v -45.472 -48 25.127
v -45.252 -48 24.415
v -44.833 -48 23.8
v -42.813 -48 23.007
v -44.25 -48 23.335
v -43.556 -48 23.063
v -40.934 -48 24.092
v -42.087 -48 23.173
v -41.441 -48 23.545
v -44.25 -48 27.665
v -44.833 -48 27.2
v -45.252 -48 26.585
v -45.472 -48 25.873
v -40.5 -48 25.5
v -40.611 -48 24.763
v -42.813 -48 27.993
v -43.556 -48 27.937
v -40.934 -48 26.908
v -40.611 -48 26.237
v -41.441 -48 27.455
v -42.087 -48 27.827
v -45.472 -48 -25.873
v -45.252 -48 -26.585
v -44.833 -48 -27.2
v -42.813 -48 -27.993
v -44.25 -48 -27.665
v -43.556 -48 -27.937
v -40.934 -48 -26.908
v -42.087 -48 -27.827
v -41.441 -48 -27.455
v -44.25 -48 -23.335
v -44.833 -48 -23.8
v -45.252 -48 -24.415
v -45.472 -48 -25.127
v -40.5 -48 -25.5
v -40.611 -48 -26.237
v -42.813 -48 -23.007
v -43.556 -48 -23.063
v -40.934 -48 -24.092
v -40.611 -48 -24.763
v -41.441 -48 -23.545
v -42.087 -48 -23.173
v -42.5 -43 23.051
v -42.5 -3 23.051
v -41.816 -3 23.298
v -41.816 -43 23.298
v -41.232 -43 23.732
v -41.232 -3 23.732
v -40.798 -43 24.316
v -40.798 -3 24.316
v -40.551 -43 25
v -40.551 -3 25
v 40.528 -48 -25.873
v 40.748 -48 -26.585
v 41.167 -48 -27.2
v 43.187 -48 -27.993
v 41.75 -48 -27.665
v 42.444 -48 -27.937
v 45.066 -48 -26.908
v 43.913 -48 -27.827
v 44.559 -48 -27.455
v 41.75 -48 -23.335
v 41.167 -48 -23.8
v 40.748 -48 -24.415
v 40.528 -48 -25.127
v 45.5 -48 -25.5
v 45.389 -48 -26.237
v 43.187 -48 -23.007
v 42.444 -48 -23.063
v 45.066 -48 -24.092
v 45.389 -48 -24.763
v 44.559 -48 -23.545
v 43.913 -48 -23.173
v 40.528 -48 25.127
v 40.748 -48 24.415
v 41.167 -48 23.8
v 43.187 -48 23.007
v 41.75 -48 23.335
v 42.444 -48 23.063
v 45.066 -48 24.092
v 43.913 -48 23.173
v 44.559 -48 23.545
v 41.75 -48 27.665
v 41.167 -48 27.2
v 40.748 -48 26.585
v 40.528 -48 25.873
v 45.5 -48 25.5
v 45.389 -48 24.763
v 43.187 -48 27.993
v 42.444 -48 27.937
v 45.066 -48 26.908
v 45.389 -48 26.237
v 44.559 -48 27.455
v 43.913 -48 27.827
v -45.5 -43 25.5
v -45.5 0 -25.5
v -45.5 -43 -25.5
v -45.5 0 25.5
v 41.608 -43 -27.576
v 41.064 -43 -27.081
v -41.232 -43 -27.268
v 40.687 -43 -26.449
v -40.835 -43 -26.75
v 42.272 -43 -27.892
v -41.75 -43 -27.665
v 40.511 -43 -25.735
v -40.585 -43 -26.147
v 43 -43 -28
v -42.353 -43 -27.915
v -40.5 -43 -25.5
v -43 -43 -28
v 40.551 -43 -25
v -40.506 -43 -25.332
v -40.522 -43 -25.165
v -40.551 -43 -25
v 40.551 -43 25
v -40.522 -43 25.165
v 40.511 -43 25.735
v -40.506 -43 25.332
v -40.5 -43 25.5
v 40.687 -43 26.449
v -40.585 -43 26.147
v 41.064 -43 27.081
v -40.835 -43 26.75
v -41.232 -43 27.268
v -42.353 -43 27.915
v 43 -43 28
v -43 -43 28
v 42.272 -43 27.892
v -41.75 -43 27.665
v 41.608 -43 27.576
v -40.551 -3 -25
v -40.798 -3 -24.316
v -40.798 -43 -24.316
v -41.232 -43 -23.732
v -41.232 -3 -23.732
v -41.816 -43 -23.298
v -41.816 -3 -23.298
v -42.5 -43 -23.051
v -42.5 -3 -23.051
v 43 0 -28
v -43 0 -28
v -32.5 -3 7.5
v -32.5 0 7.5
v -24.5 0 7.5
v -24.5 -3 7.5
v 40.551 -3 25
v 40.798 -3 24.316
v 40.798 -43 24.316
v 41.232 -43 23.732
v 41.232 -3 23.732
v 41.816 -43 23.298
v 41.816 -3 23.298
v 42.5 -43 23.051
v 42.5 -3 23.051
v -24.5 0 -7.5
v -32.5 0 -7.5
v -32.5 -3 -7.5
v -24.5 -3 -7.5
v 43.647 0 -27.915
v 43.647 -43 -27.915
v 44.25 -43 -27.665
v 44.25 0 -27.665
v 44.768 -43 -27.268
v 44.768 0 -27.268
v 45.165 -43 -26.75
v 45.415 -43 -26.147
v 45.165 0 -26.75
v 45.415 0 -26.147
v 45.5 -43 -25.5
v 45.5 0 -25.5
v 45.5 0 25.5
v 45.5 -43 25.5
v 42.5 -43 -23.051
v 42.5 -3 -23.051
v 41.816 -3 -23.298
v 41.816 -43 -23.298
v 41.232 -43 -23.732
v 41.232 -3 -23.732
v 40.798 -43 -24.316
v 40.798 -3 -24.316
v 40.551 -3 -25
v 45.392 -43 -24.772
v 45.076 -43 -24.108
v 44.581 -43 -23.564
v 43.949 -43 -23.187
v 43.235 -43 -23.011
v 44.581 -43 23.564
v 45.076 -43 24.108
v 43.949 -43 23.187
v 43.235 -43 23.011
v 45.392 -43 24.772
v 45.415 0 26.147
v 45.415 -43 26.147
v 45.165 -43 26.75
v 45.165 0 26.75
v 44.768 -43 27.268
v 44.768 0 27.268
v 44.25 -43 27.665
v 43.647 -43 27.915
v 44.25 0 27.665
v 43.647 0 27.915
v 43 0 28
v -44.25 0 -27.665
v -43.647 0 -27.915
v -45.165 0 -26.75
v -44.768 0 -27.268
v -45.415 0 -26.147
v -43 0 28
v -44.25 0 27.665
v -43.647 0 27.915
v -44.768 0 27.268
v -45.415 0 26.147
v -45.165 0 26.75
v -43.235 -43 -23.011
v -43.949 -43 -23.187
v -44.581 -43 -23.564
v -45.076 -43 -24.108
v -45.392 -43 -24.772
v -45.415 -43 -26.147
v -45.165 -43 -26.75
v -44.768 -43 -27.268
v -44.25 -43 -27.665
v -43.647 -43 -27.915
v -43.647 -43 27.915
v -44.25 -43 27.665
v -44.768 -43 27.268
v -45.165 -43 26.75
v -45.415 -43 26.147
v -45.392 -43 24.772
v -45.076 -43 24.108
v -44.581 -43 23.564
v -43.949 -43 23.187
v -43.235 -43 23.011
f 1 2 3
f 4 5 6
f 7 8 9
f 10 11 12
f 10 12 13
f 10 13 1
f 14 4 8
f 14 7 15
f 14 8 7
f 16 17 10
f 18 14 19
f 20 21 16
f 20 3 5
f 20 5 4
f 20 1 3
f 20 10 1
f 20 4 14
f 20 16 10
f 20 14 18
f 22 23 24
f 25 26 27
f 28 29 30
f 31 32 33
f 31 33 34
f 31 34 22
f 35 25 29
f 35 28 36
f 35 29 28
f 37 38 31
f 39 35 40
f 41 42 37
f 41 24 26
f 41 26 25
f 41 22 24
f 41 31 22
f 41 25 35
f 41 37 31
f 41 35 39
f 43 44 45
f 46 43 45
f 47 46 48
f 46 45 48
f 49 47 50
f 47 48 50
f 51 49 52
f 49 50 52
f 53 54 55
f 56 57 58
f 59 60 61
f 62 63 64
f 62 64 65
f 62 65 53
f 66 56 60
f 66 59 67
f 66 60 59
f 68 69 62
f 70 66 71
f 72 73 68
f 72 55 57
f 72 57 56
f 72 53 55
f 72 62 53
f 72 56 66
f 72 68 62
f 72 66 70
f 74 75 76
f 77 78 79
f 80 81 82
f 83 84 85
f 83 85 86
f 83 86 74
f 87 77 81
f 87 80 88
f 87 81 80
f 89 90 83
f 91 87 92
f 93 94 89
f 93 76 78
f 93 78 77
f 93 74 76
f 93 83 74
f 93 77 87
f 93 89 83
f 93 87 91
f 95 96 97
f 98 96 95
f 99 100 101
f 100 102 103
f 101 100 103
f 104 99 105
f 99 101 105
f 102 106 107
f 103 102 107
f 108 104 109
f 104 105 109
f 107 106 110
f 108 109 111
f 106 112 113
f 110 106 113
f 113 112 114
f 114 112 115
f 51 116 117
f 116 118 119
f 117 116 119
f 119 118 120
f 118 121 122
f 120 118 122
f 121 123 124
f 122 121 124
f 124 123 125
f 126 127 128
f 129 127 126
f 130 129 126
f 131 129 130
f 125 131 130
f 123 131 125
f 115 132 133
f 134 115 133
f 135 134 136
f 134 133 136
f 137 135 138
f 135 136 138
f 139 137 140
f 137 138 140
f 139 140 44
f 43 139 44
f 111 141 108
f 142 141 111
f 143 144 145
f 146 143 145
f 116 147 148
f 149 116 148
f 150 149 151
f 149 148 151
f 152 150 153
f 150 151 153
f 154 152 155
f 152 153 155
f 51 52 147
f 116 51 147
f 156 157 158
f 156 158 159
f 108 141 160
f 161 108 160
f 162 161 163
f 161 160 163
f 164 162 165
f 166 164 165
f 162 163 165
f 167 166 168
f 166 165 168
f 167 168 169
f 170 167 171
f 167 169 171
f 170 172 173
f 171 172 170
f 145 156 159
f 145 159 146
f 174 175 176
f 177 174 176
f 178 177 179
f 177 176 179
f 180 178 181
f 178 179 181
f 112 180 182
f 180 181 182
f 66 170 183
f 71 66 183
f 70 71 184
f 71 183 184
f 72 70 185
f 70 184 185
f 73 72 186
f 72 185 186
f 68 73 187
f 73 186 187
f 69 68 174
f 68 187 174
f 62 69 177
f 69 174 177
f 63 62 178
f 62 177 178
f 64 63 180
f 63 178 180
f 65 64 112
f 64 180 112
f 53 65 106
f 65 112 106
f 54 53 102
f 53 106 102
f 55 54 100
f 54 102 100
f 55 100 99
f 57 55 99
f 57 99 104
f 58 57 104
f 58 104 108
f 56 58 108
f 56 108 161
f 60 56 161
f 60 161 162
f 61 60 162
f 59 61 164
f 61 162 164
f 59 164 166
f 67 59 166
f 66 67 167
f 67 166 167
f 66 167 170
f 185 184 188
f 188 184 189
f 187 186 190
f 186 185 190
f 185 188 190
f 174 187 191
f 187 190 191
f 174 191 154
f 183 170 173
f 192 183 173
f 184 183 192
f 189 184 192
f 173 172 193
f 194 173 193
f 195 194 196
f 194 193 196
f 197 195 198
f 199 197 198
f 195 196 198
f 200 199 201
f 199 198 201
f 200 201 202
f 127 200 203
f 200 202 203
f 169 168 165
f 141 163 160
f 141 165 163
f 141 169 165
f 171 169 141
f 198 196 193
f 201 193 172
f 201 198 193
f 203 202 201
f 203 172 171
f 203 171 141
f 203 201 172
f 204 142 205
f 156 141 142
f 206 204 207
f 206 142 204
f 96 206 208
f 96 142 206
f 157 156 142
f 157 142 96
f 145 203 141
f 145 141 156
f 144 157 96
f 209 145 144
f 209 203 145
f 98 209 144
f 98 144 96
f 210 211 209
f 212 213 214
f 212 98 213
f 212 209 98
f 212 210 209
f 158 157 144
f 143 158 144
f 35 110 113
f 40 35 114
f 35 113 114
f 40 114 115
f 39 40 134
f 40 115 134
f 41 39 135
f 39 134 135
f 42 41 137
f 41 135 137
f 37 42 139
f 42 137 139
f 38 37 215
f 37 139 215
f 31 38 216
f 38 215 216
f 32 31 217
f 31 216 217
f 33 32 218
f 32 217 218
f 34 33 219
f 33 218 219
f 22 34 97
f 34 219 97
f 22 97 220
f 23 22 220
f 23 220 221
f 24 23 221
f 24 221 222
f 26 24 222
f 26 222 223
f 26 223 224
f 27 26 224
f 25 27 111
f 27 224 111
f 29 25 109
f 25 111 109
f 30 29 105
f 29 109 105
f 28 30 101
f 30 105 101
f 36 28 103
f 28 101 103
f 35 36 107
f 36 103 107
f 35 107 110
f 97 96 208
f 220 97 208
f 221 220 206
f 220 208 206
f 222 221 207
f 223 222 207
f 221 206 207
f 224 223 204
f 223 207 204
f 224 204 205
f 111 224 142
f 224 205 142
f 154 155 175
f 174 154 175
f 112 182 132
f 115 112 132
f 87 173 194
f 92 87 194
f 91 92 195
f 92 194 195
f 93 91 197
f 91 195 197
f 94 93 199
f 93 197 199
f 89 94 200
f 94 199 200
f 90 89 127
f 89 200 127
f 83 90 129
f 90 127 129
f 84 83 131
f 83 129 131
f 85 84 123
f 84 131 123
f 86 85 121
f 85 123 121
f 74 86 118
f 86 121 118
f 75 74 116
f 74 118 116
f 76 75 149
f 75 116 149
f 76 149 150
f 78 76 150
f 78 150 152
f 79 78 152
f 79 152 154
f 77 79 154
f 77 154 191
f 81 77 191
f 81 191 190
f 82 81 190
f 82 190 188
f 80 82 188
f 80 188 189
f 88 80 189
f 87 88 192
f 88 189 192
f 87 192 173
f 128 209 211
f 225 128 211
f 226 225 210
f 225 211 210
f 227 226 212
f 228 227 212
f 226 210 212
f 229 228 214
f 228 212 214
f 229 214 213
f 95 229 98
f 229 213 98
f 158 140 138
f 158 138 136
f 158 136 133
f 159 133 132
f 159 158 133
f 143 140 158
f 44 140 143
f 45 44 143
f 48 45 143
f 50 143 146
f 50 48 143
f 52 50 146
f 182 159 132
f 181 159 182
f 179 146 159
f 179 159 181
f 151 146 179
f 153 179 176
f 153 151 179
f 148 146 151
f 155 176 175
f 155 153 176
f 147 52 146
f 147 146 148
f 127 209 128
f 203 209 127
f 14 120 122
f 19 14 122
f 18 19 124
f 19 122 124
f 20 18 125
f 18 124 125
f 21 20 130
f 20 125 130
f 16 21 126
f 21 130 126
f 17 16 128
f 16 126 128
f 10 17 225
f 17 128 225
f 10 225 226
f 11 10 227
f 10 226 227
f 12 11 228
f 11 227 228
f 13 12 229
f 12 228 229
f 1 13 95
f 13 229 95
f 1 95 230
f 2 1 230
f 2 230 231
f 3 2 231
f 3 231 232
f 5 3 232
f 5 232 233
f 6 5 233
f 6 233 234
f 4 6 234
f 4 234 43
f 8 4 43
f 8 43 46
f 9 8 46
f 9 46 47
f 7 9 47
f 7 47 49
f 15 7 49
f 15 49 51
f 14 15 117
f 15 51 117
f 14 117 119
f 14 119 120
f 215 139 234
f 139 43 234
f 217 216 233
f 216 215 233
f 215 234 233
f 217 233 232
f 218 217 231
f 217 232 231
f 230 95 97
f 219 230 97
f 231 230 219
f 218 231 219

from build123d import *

# Parameters (mm, degrees)
PAD_DEPTH     = 43
SKETCH001_W   = 85
SKETCH001_H   = 50
SKETCH001_W_2 = 8
SKETCH001_H_2 = 15
PAD001_DEPTH  = 3
SKETCH002_R   = 2.5
PAD002_DEPTH  = 48


with BuildPart() as part:
    # Sketch → Pad (new body)
    with BuildSketch(Plane.XZ):
        with BuildLine():
            Line((-43, 28), (43, 28))
            ThreePointArc((45.5, 25.5), (44.767767, 27.267767), (43, 28))
            Line((45.5, 25.5), (45.5, -25.5))
            ThreePointArc((43, -28), (44.767767, -27.267767), (45.5, -25.5))
            Line((43, -28), (-43, -28))
            ThreePointArc((-45.5, -25.5), (-44.767767, -27.267767), (-43, -28))
            Line((-45.5, -25.5), (-45.5, 25.5))
            ThreePointArc((-43, 28), (-44.767767, 27.267767), (-45.5, 25.5))
        make_face()
        with BuildLine():
            Line((-40.55051, 25), (40.55051, 25))
            ThreePointArc((40.55051, 25), (41.232233, 23.732233), (42.5, 23.05051))
            Line((42.5, 23.05051), (42.5, -23.05051))
            ThreePointArc((42.5, -23.05051), (41.232233, -23.732233), (40.55051, -25))
            Line((40.55051, -25), (-40.55051, -25))
            ThreePointArc((-40.55051, -25), (-41.232233, -23.732233), (-42.5, -23.05051))
            Line((-42.5, -23.05051), (-42.5, 23.05051))
            ThreePointArc((-42.5, 23.05051), (-41.232233, 23.732233), (-40.55051, 25))
        make_face(mode=Mode.SUBTRACT)
    extrude(amount=PAD_DEPTH)

    # Sketch001 → Pad001 (join)
    with BuildSketch(Plane.XZ):
        Rectangle(SKETCH001_W, SKETCH001_H)
        with Locations((-28.5, 0)):
            Rectangle(SKETCH001_W_2, SKETCH001_H_2, mode=Mode.SUBTRACT)
    extrude(amount=PAD001_DEPTH)

    # Sketch002 → Pad002 (join)
    with BuildSketch(Plane.XZ):
        with Locations((-43, 25.5)):
            Circle(SKETCH002_R)
        with Locations((43, 25.5)):
            Circle(SKETCH002_R)
        with Locations((43, -25.5)):
            Circle(SKETCH002_R)
        with Locations((-43, -25.5)):
            Circle(SKETCH002_R)
    extrude(amount=PAD002_DEPTH)


solid = part.part
